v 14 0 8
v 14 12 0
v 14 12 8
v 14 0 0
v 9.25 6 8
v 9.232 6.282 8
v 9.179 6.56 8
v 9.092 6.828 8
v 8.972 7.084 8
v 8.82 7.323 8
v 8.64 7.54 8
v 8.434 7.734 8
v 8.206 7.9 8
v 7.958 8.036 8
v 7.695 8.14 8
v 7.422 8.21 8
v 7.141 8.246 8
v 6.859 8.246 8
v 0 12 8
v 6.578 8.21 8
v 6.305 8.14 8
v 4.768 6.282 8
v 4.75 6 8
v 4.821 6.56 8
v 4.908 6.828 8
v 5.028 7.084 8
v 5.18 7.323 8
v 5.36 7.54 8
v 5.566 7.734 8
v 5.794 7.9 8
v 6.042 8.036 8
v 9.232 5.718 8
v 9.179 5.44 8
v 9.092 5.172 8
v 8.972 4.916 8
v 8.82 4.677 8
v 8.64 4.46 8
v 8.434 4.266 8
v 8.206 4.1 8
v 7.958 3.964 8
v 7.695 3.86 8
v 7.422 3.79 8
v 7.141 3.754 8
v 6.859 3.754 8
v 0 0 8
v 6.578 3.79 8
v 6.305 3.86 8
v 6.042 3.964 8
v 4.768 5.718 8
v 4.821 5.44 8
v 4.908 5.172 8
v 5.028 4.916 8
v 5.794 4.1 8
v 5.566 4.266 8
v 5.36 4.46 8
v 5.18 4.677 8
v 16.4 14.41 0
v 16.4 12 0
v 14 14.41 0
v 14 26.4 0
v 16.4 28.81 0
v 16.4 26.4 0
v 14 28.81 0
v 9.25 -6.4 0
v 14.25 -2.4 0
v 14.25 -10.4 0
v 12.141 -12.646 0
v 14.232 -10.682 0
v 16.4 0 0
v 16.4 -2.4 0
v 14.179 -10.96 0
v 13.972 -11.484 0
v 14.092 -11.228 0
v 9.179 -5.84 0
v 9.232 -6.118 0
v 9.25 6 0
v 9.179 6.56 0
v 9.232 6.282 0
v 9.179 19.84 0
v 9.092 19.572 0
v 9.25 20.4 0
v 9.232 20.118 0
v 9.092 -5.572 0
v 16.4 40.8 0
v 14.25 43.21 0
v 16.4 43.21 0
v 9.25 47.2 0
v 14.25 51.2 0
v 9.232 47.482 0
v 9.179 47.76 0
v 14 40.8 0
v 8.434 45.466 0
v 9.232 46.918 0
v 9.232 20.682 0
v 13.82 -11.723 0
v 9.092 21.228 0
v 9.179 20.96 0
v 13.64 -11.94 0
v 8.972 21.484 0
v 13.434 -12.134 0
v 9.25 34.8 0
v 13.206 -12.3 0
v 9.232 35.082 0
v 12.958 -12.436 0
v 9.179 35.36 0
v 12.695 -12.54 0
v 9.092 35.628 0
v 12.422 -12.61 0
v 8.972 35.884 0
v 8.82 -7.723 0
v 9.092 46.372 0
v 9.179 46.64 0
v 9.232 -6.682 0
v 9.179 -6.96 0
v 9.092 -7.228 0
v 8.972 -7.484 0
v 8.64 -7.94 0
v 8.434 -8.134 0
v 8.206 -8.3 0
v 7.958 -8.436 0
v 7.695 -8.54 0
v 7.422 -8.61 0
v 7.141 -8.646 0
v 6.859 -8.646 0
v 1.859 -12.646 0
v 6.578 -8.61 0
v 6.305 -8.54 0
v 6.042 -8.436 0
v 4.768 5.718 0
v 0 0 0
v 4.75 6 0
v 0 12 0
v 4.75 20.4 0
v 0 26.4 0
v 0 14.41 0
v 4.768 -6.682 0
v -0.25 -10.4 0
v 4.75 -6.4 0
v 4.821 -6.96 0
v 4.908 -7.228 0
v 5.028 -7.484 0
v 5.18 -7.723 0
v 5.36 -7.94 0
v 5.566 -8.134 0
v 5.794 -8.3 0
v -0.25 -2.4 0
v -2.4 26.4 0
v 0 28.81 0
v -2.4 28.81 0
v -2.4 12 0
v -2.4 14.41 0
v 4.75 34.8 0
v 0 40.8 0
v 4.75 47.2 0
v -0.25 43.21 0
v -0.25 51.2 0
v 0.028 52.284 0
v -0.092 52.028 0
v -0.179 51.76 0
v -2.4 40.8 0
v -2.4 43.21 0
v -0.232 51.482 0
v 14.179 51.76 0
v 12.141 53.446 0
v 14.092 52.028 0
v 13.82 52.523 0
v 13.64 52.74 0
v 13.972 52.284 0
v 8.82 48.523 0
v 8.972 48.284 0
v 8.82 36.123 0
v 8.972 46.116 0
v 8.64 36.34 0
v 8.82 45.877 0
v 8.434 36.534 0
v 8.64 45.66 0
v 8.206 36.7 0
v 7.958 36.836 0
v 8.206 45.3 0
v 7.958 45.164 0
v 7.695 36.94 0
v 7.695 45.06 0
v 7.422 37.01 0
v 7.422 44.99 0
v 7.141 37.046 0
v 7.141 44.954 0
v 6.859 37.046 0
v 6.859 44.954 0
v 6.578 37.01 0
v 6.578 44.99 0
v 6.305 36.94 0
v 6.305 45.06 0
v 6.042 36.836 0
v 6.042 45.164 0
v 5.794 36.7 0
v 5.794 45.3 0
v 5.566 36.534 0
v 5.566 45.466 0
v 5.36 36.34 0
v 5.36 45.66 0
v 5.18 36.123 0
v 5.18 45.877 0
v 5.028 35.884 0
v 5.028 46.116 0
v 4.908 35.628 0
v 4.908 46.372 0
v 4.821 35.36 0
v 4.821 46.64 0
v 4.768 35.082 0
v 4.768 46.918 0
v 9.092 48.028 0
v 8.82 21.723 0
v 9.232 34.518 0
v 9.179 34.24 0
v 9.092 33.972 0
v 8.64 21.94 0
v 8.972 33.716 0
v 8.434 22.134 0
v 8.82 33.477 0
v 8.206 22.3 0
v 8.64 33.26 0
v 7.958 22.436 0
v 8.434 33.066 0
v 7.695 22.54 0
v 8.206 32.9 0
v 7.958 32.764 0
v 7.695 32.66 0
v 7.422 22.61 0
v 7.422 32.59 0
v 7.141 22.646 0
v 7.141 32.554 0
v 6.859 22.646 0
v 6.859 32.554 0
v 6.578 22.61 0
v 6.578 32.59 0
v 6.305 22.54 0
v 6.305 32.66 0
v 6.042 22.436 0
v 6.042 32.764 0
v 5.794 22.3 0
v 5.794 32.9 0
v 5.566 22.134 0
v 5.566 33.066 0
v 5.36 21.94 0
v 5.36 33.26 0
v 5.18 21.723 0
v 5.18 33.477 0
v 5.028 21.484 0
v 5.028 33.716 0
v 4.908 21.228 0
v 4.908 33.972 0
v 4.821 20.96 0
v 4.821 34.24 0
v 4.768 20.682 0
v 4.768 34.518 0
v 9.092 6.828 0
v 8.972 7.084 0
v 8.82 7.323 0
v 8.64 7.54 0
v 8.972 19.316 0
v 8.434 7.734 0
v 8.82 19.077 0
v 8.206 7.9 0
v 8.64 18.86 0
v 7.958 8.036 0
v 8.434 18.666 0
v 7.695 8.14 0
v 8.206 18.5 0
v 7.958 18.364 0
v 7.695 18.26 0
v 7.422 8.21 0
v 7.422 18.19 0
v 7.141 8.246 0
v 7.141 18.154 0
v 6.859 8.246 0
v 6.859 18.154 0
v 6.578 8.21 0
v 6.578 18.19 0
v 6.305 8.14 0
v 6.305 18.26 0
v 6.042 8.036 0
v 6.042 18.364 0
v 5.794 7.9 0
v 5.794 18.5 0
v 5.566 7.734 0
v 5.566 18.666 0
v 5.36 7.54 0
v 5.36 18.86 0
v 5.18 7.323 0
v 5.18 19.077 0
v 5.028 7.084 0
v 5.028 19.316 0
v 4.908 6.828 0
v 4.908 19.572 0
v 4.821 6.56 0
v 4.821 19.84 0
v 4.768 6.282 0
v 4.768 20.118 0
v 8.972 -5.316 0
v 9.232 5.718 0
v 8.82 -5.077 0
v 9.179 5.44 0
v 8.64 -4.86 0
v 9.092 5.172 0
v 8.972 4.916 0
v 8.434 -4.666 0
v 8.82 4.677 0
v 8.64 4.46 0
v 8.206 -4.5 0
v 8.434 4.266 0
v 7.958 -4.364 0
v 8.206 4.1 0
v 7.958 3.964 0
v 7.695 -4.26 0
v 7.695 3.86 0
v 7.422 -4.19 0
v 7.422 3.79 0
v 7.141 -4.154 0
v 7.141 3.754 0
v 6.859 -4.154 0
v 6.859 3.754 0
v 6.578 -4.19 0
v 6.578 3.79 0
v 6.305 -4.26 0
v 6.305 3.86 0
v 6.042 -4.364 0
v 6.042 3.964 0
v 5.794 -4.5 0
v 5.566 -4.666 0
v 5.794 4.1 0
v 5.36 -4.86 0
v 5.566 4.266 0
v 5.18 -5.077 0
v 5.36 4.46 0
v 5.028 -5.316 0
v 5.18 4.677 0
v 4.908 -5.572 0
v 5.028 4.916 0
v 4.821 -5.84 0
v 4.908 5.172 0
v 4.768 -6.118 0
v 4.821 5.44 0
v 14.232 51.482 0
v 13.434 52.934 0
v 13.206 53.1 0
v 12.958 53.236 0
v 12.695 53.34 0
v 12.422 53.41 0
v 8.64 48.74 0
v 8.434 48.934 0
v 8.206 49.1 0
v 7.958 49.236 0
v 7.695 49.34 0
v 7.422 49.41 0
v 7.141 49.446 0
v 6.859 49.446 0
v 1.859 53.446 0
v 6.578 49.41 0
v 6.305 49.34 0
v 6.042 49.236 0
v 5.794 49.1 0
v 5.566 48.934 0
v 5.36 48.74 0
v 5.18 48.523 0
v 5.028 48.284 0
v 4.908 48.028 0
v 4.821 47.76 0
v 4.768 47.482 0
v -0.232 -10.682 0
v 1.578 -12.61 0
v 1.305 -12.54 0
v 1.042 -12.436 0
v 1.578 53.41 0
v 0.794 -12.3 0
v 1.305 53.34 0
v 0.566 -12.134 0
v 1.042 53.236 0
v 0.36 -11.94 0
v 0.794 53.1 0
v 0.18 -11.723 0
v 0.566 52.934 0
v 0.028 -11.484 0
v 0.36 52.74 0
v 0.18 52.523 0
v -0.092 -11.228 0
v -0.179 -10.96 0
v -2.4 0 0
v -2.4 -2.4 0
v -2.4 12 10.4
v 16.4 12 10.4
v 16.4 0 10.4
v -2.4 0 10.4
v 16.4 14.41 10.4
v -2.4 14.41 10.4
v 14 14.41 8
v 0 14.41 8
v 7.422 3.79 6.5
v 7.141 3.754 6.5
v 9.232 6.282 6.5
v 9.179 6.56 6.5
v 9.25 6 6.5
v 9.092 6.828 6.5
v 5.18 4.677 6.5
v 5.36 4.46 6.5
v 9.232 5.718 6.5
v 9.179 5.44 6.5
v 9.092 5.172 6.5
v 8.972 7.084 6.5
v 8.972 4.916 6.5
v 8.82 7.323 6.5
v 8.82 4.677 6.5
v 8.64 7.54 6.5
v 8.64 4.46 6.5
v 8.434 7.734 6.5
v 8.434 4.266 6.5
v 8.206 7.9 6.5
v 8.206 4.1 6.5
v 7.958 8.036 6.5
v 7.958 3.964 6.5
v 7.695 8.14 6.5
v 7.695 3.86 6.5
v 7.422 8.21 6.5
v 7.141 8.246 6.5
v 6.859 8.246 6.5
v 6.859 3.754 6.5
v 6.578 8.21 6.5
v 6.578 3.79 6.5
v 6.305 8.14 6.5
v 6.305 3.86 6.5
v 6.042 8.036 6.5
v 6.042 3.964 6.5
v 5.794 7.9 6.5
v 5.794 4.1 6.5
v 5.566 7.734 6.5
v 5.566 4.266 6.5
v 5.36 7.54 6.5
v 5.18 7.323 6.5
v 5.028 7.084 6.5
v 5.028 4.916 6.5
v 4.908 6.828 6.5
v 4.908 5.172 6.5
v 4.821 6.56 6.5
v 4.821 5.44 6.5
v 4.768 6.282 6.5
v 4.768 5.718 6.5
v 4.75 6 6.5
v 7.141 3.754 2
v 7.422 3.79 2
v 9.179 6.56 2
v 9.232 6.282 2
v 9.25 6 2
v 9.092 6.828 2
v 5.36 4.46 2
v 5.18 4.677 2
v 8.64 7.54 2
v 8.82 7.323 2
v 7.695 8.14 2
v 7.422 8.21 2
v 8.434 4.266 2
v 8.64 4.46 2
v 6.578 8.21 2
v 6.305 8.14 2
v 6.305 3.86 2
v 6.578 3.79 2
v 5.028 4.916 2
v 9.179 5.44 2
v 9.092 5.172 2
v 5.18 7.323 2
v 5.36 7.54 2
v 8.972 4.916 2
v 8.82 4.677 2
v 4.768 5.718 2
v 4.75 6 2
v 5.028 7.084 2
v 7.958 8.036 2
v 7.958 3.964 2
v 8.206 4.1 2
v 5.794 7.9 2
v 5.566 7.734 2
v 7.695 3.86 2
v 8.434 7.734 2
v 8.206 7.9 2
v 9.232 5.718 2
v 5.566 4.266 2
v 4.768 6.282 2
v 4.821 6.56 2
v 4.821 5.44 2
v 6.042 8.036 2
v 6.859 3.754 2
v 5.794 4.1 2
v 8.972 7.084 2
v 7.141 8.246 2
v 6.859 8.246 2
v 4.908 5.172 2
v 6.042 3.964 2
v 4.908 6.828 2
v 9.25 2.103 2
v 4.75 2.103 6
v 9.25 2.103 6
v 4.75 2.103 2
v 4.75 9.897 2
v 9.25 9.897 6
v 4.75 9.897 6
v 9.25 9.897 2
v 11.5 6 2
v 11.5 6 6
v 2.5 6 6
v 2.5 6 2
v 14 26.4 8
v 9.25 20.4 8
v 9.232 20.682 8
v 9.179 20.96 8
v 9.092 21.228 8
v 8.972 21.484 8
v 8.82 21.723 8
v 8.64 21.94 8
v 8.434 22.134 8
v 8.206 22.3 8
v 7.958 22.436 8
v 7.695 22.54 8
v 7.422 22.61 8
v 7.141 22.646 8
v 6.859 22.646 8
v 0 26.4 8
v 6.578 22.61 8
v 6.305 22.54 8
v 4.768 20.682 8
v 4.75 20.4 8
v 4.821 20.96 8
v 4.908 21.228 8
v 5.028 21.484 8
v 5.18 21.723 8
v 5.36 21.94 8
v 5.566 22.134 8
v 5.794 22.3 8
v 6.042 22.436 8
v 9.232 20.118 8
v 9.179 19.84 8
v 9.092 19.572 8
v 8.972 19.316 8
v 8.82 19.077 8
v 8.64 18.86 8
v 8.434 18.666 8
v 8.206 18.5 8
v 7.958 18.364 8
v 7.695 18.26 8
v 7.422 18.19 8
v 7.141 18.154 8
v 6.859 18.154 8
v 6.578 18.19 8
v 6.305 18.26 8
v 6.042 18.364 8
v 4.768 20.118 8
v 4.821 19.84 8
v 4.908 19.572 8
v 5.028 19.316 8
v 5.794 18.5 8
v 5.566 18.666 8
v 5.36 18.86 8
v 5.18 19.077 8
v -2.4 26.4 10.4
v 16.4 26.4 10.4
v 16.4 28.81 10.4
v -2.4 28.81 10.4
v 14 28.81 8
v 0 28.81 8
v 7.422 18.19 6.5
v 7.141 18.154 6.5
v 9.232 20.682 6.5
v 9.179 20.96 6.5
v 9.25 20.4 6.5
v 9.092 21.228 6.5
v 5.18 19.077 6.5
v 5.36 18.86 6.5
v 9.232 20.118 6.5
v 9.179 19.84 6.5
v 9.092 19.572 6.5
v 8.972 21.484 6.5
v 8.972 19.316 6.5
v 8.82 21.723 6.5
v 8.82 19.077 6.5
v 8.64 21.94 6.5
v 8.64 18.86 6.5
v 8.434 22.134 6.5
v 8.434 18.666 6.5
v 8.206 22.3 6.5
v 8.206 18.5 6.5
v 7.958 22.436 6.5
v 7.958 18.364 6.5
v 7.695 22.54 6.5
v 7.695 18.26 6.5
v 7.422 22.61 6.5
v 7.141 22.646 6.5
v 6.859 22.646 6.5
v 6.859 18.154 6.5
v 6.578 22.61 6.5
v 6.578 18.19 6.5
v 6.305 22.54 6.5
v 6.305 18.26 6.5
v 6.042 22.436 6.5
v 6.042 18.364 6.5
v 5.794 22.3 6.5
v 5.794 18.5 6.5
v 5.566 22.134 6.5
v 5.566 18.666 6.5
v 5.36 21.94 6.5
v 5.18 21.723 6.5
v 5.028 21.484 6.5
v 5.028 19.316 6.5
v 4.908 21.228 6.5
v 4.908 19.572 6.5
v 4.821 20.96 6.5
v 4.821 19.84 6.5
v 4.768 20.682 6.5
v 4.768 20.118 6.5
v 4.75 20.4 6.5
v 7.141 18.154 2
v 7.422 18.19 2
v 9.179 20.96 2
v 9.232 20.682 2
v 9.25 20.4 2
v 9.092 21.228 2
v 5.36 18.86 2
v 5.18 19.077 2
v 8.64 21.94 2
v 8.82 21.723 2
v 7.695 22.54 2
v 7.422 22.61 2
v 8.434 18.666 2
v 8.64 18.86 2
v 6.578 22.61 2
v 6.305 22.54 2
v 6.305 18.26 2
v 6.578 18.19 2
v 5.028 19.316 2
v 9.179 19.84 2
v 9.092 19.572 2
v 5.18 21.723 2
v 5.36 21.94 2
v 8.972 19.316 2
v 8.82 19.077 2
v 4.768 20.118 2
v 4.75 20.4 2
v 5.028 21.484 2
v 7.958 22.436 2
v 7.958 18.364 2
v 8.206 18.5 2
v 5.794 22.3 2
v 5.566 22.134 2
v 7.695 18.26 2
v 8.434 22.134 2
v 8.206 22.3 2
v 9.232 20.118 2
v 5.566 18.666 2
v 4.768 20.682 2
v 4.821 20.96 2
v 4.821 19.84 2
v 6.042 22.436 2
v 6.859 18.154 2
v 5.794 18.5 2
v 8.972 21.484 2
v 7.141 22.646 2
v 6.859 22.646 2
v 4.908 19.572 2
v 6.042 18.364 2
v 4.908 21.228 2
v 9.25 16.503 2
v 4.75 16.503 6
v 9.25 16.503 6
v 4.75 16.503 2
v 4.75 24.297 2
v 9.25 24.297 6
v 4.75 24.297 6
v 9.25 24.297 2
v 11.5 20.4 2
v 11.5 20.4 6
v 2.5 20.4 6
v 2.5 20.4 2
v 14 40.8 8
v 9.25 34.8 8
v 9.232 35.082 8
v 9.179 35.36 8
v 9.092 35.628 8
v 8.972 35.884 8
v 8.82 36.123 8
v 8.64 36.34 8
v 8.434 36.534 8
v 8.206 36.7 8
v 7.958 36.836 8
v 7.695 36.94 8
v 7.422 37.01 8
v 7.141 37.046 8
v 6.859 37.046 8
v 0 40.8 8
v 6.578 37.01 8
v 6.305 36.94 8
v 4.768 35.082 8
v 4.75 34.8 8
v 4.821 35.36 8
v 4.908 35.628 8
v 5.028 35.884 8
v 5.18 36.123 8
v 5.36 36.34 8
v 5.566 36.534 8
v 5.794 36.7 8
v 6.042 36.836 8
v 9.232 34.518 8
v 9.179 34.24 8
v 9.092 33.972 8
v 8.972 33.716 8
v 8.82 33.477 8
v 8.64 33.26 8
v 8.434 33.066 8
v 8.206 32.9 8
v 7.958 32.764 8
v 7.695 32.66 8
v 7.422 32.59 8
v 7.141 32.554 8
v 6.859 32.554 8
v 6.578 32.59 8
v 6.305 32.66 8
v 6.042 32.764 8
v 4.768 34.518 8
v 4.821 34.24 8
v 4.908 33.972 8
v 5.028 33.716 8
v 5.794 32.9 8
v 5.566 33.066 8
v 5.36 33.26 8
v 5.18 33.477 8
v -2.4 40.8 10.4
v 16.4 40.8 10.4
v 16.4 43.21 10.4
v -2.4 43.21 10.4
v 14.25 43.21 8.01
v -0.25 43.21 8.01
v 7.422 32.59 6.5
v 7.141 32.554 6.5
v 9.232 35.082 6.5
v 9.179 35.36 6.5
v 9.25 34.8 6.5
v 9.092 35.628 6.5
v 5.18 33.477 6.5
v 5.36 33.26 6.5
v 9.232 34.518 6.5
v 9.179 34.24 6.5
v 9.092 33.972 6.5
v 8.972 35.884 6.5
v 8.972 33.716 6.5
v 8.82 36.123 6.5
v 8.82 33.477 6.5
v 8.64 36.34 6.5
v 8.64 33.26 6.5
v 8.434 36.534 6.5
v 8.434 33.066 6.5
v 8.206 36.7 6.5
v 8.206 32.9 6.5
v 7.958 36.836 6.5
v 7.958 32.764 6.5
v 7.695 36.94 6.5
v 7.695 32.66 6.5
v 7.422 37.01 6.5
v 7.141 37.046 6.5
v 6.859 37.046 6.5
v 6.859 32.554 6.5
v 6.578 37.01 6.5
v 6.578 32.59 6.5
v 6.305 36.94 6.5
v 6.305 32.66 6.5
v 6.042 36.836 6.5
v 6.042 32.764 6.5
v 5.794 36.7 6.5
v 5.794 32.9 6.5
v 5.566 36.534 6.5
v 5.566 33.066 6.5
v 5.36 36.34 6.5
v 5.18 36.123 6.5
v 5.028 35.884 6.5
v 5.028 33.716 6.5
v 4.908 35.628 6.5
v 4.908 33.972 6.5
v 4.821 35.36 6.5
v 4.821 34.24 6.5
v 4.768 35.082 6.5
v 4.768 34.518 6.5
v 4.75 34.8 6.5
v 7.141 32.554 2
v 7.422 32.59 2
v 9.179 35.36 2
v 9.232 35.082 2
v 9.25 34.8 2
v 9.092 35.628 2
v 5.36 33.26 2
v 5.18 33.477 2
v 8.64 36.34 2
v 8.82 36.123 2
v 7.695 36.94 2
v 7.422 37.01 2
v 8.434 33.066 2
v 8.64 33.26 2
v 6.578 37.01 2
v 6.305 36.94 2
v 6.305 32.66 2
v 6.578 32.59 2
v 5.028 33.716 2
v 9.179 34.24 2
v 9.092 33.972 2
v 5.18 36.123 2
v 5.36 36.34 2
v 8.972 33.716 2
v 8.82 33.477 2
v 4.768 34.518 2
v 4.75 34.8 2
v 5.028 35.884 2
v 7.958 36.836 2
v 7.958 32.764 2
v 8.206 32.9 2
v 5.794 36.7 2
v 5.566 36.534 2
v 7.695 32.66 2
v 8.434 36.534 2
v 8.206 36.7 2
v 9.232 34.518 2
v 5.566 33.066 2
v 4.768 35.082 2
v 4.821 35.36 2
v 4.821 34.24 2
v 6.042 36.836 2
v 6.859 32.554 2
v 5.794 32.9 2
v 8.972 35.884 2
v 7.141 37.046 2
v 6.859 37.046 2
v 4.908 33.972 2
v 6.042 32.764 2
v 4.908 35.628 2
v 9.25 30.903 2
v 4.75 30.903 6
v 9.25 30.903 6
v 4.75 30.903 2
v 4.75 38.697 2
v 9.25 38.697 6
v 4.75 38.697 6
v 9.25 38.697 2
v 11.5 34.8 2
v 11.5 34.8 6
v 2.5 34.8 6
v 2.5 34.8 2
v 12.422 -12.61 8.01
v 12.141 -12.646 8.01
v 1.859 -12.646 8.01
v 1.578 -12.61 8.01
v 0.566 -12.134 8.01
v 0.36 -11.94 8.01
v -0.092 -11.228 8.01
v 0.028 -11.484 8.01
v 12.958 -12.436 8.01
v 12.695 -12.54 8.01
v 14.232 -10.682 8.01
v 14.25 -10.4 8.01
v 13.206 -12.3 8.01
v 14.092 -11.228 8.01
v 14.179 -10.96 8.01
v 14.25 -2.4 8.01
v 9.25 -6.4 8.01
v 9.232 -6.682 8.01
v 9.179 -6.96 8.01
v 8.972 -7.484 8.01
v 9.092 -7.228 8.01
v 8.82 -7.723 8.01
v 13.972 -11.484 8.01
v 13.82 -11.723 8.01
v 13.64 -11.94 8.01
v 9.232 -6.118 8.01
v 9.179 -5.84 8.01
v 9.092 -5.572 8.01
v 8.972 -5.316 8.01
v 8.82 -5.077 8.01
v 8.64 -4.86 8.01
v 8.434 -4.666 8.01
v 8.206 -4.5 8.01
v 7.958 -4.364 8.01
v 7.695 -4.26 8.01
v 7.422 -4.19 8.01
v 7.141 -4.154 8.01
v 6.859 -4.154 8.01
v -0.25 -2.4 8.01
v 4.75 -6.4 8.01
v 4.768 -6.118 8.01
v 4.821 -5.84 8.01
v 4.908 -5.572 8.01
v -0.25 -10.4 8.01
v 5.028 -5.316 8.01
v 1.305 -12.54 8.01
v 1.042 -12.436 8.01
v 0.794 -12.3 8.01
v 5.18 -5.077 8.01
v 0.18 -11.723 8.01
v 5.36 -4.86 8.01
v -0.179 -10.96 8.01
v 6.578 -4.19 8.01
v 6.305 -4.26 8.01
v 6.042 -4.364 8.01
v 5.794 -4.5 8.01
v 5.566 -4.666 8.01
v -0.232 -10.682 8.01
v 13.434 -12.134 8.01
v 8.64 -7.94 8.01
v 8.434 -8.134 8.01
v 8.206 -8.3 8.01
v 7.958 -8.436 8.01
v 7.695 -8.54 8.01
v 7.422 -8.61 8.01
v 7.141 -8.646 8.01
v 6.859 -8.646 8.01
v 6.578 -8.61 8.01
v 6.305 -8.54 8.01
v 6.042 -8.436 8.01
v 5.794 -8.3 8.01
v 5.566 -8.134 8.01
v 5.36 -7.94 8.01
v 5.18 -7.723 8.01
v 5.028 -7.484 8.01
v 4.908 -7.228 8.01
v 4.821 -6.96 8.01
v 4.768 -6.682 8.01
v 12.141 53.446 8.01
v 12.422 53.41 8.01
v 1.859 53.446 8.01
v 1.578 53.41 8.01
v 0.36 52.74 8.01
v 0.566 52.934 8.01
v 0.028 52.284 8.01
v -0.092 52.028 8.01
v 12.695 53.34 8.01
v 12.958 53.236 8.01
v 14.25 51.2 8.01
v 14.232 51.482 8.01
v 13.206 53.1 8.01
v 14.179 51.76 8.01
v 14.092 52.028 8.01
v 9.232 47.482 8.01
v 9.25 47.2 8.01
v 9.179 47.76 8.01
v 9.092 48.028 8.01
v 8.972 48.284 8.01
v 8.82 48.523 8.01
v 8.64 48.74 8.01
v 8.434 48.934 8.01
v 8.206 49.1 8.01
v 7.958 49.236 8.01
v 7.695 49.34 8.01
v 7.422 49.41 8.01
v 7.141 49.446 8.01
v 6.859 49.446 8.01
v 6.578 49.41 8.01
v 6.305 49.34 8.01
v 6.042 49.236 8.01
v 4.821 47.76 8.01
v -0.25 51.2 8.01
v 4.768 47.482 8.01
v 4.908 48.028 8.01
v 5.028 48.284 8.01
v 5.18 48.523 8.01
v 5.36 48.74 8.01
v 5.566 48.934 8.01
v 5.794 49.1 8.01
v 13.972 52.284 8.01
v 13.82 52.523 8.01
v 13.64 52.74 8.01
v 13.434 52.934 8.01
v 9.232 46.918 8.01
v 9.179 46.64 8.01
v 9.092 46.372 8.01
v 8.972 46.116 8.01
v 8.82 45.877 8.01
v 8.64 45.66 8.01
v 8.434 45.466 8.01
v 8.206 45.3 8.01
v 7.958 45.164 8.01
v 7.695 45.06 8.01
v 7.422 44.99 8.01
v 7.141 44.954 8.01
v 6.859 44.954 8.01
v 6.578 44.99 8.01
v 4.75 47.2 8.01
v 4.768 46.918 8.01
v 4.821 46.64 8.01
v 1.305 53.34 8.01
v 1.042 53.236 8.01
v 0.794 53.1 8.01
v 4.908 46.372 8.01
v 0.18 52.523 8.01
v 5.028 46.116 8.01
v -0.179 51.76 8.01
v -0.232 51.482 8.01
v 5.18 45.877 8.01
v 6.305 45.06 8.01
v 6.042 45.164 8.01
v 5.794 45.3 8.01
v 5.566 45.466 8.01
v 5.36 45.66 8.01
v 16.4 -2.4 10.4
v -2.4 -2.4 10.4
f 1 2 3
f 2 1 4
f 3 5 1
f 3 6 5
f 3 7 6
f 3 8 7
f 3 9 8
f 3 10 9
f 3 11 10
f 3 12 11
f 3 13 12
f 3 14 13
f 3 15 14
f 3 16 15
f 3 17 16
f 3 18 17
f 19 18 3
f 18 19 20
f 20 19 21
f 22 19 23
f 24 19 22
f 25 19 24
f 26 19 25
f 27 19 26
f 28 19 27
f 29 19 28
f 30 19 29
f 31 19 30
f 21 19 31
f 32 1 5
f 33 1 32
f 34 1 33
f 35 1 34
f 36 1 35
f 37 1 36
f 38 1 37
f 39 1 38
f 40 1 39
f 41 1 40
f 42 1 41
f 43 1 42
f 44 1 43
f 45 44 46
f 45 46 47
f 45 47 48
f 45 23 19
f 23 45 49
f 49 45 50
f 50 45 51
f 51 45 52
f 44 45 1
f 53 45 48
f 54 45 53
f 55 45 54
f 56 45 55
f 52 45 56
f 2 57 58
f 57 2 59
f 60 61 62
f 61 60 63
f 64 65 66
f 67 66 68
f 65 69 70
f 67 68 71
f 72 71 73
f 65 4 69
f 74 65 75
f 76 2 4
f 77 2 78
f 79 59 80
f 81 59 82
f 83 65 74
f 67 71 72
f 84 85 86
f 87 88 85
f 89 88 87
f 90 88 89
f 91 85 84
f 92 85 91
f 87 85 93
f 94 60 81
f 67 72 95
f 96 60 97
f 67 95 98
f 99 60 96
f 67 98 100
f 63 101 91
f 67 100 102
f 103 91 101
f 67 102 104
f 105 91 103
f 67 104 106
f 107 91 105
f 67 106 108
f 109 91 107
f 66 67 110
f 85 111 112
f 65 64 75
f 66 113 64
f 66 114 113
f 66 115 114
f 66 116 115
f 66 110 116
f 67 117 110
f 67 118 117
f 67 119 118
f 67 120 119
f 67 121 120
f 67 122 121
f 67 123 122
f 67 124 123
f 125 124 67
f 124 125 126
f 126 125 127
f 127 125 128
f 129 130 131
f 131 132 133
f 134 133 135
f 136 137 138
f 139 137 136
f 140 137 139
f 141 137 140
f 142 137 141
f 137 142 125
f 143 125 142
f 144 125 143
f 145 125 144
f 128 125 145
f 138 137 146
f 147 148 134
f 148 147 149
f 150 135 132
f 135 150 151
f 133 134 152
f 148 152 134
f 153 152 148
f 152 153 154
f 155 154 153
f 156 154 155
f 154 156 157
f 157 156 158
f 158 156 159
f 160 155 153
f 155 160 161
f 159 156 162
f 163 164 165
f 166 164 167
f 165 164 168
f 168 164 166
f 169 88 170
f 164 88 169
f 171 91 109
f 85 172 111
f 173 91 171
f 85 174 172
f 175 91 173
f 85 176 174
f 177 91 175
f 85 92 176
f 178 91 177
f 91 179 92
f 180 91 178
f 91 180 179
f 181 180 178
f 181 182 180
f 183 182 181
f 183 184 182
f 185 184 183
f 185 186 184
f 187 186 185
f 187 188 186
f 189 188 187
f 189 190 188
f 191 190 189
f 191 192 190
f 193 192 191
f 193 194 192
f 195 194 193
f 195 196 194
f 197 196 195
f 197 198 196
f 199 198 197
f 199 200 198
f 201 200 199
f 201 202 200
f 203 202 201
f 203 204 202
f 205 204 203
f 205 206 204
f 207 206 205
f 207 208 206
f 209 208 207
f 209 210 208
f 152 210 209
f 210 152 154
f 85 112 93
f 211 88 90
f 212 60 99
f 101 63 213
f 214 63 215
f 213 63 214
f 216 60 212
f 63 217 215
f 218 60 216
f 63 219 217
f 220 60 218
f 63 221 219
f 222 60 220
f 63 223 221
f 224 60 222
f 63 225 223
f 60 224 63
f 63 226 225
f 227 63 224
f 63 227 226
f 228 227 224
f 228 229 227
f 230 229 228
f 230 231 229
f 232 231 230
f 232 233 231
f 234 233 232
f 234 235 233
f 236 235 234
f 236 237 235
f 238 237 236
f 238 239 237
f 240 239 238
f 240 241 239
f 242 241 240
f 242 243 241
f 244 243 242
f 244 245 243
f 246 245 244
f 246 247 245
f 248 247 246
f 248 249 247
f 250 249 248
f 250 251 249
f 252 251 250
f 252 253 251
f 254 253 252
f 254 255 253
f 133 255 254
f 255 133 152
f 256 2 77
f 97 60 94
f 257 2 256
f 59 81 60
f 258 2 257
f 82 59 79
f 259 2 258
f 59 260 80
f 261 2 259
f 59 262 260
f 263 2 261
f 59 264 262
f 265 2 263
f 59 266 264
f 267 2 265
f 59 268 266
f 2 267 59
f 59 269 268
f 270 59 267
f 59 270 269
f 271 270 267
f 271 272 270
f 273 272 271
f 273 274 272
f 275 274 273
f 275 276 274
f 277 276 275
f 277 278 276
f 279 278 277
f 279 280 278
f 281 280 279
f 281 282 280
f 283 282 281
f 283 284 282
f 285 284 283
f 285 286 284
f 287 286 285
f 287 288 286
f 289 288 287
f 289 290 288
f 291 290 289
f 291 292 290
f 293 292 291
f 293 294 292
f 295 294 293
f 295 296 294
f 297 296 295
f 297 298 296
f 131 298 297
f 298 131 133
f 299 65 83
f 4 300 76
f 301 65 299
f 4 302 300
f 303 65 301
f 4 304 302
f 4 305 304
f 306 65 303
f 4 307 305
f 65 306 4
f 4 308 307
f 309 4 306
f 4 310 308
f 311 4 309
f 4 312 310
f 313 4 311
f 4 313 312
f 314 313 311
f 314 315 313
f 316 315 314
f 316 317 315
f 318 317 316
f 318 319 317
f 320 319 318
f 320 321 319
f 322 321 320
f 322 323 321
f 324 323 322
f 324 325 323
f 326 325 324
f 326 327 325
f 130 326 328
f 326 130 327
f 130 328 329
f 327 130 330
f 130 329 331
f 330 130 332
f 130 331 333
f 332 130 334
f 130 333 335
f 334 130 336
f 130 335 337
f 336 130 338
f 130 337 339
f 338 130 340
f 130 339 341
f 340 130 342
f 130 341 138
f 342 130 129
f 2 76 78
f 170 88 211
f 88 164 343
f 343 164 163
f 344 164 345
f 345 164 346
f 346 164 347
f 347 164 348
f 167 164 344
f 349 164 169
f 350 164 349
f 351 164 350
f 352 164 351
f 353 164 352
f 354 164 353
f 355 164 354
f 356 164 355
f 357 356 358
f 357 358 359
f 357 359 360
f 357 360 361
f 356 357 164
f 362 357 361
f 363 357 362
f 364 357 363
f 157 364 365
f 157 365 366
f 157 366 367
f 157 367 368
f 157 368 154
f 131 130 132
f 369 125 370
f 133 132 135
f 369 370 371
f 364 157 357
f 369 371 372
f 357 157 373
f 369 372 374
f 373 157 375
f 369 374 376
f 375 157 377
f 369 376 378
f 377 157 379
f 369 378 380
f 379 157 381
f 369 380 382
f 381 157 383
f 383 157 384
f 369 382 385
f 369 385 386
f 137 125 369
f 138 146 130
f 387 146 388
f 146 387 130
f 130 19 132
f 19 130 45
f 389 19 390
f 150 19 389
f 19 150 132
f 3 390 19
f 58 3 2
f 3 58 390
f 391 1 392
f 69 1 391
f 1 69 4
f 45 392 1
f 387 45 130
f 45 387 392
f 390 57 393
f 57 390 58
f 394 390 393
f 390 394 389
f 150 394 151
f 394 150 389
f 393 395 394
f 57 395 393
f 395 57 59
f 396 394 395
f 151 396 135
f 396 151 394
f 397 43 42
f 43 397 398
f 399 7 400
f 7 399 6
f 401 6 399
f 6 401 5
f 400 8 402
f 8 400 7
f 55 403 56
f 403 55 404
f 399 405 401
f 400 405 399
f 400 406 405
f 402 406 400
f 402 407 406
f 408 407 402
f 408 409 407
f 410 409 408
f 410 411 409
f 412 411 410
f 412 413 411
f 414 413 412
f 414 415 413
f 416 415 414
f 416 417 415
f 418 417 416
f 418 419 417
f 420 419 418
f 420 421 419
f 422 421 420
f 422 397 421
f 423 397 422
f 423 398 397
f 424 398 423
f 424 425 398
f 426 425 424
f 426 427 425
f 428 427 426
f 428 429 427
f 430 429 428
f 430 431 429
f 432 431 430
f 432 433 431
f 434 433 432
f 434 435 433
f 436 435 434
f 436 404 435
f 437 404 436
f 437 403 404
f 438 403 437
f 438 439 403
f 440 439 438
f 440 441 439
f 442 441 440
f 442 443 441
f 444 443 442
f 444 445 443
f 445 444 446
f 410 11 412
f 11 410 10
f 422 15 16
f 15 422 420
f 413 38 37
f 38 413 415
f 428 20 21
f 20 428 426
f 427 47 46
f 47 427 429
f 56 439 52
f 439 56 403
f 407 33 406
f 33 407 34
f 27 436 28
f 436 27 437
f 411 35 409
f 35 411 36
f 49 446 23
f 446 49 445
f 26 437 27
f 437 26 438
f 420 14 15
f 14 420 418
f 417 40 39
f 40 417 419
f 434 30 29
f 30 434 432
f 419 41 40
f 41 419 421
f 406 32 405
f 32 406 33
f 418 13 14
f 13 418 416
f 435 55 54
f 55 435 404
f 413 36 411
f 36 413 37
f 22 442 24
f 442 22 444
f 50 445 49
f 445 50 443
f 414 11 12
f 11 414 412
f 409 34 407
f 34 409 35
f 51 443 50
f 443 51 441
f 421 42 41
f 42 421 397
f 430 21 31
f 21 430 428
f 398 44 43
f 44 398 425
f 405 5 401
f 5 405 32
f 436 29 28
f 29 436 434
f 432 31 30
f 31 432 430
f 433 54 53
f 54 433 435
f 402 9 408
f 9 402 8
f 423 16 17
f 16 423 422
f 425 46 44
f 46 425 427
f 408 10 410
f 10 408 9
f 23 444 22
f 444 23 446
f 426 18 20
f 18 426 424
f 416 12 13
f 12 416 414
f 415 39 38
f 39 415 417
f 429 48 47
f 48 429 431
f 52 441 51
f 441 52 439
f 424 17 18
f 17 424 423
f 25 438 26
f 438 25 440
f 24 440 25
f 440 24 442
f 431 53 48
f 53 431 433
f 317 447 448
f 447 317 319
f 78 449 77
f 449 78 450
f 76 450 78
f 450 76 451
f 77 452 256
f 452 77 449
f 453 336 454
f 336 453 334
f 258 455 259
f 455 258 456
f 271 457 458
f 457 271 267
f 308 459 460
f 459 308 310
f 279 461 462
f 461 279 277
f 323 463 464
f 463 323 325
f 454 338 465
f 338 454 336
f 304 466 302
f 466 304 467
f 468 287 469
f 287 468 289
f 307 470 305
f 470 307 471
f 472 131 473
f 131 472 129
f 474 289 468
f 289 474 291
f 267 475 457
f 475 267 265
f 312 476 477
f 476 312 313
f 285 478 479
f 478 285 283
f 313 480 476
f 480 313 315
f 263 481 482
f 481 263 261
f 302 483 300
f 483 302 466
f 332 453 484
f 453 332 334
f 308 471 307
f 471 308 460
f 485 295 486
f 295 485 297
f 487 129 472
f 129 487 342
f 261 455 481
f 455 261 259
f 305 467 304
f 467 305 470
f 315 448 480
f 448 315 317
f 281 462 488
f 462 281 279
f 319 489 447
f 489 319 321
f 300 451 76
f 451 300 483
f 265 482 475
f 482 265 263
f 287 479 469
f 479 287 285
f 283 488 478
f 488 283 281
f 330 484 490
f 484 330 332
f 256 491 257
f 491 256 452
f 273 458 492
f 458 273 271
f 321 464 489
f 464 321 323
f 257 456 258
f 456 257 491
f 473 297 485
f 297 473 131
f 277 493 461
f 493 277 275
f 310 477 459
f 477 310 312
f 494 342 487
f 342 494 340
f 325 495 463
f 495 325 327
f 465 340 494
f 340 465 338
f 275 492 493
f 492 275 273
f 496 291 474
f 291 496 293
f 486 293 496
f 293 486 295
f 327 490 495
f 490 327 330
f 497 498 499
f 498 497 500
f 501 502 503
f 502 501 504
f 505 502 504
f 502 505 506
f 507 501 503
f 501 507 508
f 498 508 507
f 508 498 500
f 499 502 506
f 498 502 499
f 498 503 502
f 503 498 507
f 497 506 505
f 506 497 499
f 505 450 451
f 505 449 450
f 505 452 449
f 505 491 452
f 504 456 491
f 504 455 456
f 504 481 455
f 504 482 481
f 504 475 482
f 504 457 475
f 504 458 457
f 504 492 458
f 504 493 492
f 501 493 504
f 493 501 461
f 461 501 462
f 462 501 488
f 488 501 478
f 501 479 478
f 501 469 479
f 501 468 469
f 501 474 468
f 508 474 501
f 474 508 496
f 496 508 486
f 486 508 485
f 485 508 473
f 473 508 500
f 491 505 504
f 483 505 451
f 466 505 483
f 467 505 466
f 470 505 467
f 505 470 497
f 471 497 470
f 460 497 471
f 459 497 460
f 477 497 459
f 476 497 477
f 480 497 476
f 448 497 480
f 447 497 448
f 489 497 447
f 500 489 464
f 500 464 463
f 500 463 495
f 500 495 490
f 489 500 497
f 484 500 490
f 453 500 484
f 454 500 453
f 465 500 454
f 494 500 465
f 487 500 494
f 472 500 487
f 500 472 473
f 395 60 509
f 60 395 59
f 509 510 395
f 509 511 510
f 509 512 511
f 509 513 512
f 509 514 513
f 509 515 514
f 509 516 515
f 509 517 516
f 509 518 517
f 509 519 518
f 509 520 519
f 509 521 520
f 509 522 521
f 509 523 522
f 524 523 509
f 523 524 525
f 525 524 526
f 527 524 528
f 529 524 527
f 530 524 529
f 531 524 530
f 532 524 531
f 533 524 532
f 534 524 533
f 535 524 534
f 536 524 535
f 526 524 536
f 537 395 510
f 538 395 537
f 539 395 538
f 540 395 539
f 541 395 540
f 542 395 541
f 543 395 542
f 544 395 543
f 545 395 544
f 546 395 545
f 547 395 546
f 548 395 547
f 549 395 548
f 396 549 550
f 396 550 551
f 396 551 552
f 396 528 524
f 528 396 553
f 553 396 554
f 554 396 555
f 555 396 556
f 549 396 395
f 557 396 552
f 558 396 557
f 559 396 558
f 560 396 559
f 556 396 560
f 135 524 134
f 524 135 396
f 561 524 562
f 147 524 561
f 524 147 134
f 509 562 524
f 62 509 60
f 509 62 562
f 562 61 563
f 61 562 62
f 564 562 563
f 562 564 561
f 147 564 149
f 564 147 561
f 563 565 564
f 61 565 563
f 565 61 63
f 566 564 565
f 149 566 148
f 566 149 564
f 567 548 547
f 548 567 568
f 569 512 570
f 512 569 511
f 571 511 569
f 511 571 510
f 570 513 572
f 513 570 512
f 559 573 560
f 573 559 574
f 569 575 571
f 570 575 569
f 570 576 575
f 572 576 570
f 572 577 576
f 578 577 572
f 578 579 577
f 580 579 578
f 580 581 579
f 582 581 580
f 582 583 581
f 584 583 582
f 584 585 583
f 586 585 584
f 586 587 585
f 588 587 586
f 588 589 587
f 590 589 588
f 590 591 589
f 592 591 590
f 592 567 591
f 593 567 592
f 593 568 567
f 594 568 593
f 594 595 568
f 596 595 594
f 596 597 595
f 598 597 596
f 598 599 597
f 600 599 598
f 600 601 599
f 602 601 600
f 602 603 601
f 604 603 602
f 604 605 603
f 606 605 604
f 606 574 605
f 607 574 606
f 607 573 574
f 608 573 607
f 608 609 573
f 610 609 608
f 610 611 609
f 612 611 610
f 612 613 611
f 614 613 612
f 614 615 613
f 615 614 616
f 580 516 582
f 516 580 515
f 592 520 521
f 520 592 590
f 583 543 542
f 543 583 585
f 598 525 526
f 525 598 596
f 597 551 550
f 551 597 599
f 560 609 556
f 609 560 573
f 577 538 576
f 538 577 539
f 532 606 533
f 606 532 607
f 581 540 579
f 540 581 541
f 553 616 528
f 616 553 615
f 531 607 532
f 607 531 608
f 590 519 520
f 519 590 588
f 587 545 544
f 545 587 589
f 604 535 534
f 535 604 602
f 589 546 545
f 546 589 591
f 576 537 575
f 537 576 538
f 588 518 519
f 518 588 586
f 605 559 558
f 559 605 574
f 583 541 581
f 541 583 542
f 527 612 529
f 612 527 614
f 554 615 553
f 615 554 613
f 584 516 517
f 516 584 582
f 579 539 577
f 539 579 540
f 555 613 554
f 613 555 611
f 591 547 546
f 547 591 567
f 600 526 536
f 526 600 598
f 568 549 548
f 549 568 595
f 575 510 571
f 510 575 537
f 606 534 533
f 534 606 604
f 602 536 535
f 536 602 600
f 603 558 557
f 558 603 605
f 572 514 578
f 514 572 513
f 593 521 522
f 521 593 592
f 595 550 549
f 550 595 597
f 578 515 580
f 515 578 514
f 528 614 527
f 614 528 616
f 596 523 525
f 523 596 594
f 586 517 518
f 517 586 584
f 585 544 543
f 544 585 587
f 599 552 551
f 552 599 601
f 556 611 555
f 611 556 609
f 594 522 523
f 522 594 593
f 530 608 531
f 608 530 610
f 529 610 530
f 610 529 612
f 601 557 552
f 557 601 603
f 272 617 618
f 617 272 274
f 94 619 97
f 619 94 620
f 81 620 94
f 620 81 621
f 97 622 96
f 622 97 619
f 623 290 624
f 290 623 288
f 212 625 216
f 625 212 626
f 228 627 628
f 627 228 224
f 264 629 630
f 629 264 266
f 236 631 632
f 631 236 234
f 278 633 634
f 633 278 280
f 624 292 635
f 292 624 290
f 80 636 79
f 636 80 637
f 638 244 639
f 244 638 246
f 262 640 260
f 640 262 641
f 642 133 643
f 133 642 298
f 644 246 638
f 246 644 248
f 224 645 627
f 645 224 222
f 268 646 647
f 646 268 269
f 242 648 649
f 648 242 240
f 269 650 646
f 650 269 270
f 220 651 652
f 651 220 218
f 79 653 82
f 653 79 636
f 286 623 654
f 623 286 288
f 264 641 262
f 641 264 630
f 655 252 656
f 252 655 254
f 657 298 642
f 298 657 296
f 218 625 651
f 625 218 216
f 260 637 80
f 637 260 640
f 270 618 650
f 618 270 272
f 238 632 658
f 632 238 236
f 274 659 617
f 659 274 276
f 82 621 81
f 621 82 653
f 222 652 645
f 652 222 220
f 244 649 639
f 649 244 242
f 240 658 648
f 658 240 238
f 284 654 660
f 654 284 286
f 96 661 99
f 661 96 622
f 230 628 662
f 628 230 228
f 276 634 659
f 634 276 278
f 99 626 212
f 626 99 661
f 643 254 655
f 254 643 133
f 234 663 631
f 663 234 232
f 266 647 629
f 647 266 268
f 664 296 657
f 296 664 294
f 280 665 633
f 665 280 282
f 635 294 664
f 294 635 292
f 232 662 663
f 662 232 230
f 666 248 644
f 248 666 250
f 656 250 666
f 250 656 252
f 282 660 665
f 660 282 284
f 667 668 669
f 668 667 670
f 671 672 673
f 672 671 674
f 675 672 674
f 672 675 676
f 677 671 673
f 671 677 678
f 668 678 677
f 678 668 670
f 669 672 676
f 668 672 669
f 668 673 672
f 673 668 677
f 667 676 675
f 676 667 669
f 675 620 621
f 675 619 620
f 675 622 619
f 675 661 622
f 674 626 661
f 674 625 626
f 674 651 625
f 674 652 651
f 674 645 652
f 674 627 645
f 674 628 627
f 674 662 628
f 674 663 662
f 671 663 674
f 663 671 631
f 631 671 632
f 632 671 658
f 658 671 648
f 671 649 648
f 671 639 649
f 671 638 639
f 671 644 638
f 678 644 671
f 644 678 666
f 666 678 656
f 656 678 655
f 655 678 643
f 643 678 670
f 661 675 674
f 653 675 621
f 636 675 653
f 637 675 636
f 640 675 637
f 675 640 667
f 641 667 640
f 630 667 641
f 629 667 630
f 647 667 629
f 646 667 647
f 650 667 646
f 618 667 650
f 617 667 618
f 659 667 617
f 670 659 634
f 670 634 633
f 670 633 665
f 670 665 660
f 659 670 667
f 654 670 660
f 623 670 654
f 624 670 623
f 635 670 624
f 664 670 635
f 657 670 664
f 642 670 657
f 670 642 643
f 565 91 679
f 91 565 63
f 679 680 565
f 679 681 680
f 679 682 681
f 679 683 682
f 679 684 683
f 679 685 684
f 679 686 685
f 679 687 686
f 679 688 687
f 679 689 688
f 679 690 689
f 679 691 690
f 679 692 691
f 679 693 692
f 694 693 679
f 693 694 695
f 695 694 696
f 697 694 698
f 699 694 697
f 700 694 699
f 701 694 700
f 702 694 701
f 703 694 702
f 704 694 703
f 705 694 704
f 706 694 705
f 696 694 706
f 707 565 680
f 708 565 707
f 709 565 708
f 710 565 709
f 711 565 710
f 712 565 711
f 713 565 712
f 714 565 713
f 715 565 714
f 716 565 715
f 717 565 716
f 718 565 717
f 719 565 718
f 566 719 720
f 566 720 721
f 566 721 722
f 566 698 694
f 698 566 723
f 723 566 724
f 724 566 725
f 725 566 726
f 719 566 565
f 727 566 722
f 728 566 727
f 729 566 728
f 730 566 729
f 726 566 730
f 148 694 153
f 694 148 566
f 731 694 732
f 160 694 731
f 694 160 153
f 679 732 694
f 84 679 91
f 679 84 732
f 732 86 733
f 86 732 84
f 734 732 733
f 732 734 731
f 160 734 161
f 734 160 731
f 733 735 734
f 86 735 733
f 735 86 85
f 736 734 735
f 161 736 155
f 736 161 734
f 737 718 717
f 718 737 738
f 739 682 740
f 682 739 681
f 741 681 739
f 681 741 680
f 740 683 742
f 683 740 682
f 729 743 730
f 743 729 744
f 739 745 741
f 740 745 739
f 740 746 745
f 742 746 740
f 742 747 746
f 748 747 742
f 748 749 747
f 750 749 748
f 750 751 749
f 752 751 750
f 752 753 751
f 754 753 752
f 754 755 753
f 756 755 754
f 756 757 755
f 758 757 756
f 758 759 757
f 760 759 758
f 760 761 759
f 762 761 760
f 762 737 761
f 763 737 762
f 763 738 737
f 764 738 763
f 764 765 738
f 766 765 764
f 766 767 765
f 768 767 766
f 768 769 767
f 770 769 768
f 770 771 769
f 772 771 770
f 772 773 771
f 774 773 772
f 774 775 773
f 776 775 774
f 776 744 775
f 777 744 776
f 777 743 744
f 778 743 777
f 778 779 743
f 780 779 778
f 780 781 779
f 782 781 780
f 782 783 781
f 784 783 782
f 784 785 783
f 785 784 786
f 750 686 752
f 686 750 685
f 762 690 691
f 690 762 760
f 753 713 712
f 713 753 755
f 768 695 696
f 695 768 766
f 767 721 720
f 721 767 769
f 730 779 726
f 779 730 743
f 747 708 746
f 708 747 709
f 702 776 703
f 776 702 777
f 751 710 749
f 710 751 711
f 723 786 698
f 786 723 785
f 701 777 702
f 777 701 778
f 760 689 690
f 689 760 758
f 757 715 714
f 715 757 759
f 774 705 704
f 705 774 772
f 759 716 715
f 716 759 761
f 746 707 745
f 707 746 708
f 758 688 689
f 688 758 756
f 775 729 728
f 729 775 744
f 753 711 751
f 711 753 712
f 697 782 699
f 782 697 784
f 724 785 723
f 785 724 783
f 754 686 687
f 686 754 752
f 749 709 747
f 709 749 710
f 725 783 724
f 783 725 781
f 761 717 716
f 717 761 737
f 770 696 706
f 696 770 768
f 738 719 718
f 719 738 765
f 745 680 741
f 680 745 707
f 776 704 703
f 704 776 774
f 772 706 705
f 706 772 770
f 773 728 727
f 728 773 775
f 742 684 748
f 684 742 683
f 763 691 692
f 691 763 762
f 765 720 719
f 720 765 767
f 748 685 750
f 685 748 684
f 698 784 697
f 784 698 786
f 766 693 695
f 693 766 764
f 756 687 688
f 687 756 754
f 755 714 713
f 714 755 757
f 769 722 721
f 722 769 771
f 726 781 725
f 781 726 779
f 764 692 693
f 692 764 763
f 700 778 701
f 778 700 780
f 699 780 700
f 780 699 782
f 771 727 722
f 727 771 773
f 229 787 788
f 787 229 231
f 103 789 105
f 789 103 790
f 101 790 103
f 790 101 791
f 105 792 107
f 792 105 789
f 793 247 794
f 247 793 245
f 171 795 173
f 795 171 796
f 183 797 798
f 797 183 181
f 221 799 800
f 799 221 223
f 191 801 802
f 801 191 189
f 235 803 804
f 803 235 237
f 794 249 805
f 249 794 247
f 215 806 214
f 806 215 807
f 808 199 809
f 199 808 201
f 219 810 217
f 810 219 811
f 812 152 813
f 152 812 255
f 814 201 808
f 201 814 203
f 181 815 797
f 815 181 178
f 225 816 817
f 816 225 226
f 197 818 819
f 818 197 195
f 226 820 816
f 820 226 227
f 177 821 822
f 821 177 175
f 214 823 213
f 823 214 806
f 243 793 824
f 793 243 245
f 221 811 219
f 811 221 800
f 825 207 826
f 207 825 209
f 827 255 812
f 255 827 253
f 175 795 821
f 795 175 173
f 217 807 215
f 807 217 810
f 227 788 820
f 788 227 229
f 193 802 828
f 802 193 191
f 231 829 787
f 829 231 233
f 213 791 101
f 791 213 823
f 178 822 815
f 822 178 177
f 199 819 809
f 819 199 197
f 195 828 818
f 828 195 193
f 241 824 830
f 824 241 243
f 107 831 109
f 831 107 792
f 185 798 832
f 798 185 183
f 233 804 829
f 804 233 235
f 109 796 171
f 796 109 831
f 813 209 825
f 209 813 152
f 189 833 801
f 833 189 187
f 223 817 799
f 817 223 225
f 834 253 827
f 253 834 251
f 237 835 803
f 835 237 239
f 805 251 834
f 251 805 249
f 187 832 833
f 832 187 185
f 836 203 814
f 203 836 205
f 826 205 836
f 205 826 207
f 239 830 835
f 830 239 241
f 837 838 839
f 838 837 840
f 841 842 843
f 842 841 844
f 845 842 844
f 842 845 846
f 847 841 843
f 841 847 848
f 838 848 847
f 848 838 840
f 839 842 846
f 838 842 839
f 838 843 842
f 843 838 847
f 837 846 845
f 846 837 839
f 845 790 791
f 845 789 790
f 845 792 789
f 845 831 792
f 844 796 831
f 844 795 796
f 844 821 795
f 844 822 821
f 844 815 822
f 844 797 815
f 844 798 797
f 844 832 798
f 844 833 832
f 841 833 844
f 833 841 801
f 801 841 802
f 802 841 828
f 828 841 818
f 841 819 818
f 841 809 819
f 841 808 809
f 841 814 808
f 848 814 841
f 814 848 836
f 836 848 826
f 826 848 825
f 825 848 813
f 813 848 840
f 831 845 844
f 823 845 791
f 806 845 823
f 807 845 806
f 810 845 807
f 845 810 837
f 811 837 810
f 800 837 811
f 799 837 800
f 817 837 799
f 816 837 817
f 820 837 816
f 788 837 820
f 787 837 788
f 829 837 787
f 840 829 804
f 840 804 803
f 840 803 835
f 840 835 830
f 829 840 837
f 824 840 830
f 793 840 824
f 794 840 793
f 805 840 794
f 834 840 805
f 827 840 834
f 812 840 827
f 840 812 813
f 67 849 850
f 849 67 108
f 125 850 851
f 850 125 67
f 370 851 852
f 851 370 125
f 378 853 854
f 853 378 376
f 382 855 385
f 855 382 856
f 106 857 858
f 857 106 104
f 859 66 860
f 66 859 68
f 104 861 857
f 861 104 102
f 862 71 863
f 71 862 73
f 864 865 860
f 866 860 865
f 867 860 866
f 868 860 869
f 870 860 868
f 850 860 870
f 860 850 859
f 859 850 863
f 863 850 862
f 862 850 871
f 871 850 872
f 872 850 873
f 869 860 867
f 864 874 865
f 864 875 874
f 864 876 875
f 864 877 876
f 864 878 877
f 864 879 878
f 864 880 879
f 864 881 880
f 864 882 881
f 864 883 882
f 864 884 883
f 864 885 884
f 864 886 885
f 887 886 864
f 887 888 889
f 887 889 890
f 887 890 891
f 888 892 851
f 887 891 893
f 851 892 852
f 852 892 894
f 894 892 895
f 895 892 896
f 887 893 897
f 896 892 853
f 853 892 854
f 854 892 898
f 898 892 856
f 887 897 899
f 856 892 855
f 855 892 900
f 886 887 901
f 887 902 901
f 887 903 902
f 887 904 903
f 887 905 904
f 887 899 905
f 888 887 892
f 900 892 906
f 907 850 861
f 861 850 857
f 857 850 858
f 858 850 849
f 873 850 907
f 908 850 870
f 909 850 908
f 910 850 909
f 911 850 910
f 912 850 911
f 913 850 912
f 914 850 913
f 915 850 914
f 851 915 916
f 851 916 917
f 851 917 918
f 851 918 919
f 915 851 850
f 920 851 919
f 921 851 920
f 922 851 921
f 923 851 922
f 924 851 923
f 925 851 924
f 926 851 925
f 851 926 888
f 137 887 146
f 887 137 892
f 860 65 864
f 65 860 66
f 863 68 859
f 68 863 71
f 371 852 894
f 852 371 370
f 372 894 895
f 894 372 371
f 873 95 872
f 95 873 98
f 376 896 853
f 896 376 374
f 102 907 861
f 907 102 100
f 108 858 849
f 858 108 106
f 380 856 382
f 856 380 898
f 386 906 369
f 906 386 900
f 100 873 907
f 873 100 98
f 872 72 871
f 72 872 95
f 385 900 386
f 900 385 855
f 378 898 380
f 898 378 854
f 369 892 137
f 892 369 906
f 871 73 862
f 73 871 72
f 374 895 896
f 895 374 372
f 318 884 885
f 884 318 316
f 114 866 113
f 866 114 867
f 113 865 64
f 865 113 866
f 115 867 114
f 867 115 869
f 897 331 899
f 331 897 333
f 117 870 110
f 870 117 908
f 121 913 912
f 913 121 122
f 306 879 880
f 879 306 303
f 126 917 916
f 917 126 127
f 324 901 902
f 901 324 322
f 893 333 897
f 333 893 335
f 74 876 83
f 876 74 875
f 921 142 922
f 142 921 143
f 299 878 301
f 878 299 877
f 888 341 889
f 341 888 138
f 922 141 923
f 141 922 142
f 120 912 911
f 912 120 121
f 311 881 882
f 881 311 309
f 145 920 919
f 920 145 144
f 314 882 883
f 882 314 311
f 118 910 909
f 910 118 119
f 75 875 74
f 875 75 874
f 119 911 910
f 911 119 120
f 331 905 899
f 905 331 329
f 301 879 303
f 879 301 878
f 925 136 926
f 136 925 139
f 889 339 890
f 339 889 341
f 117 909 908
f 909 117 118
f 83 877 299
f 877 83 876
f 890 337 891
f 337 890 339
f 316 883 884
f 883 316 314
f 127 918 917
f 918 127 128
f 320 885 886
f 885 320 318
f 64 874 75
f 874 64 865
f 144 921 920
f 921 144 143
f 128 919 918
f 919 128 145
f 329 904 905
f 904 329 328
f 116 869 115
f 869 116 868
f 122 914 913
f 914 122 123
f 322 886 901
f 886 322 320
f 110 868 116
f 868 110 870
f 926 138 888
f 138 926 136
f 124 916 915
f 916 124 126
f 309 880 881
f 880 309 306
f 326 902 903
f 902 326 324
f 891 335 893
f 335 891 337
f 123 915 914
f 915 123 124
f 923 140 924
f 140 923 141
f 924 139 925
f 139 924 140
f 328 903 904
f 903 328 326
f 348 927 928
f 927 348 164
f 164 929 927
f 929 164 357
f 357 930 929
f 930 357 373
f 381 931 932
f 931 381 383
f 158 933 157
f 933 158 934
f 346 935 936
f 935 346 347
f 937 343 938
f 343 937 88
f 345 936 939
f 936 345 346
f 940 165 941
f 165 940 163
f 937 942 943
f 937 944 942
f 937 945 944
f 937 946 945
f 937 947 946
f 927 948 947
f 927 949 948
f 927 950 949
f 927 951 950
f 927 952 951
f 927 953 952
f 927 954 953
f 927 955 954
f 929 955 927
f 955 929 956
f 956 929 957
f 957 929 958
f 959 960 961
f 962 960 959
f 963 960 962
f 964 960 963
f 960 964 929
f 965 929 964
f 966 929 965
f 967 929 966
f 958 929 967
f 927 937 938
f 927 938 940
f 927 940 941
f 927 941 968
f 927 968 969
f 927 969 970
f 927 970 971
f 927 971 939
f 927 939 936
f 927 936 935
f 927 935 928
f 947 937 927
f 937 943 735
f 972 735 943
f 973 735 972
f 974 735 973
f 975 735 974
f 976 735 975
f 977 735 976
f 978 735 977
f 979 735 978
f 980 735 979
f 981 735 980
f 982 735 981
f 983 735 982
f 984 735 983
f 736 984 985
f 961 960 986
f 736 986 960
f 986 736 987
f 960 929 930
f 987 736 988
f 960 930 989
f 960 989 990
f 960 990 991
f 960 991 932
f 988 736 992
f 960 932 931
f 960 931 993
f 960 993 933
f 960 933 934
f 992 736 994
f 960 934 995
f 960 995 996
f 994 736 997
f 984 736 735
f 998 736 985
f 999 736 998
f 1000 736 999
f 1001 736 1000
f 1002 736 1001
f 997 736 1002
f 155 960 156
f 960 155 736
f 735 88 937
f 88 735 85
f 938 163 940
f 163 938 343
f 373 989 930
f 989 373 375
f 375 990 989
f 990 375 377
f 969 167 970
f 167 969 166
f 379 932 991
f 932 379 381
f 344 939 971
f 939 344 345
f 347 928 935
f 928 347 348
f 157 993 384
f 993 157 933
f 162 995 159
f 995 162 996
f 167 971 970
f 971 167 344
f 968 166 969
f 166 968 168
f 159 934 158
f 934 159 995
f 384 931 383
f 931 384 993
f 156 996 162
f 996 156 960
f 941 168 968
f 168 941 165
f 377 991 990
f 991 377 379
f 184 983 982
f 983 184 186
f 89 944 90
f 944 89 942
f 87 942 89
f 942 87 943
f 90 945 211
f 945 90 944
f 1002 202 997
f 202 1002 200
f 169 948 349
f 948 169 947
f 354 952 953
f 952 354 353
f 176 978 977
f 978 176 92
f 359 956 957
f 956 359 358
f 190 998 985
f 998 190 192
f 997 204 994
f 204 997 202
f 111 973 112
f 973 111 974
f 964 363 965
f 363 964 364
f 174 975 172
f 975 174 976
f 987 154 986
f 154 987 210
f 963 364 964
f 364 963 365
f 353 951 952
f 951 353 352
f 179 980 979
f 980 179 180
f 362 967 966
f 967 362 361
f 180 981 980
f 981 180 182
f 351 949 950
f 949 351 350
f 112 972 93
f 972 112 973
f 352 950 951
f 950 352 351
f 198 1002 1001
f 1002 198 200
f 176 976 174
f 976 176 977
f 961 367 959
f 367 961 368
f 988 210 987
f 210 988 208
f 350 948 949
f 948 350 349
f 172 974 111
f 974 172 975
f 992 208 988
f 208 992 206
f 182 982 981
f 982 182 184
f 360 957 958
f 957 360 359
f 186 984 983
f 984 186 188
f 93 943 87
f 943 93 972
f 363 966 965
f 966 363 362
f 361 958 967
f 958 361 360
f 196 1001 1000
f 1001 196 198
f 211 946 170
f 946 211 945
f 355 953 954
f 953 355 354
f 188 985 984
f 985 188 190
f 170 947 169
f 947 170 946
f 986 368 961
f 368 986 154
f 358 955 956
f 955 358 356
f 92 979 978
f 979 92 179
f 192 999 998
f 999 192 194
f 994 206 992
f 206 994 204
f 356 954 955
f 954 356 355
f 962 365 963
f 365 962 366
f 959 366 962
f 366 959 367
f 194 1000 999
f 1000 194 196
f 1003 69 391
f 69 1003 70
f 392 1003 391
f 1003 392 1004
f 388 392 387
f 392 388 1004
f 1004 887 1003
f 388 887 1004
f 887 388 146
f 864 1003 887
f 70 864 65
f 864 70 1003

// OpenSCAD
// [FL_INDEX: keywords="openscad, 3d_parametric, Configurable_Terminal_Block, csg_solid" | COT="Parametric OpenSCAD design from 3DCodeverse"]
// Title: Configurable Terminal Block

//
// Terminal Block
//
//

//How many terminals in the block
NoTerminals = 3; // [1,2,3,4,5,6,7,8,9,10,11,12,13,14,15]
// Diameter of screw in terminal
TerminalHoleSize = 4;
//Terminal Height in mm
TerminalHeight = 8;
//Width of each terminal in mm
TerminalWidth = 12;
//Block Width in mm
BlockWidth = 14;
//Terminal Divider width in mm
TerminalDivider = 2.4;
// Nut Thickness
NutThickness = 4;
// Tabs required
ReqTabs = "Yes"; //[Yes,No]
//Mounting tab length
MountTabLength = 8;
//Mounting tab Height
MountTabHeight = 8;
//Mount tab hole diameter in mm
MountHole = 4;
//Clearence
Clearence = 0.5; 
//Are the nuts Enclosed (nuts added during build - print must be paused) or Slotted (nuts added after build) or Bolted that is Hex head bolt inserted post print.
Enclose =1; //[1:Enclosed, 0: Slotted, 2:Bolted]


//Height of the top of the nut above the base
NutHeight = Enclose > 1 ? NutThickness : TerminalHeight - 2;
//echo (NutHeight);


for (i =[ 0:NoTerminals - 1]) {
	translate ([0,(TerminalWidth + TerminalDivider) * i ,0]) 
		terminal() ;
	}

translate ([- TerminalDivider ,- TerminalDivider , 0]) 
		cube([BlockWidth + TerminalDivider * 2,
				TerminalDivider ,
				TerminalHeight + TerminalDivider]);
if (ReqTabs == "Yes") {
	translate ([0,-TerminalDivider,0]) mirror ([0,1,0]) tab() ;
	translate ([0,(TerminalWidth + TerminalDivider) * NoTerminals,0]) tab() ;
	}

module tab() {
	difference () {
		translate ([MountHole /2, 0,0]) 
			minkowski() {
				cube([BlockWidth - MountHole,
					MountTabLength ,
					MountTabHeight ]);
				cylinder ( r= (MountHole + Clearence )/2 , h =.01 , $fn=50);
			}
		translate ([BlockWidth /2, MountTabLength /2, -1]) cylinder ( r= (MountHole + Clearence )/2 , h = MountTabHeight + 2, $fn=50);
	}
}



module terminal() {
difference() {
	union() {
		cube([BlockWidth,TerminalWidth,TerminalHeight]);
		translate ([- TerminalDivider , TerminalWidth , 0]) 
				cube([BlockWidth + (TerminalDivider * 2),
					TerminalDivider + 0.01 ,
					TerminalHeight + TerminalDivider]);
	}
	translate ([BlockWidth / 2,
				TerminalWidth / 2,  
				NutHeight  + .5]) 
			cylinder ( r= (TerminalHoleSize + Clearence )/2 , 
				h = TerminalHeight, $fn=50);

	translate ([BlockWidth /2,
		TerminalWidth /2,  -1]) 
		cylinder ( r= ( TerminalHoleSize + Clearence ) / 2 , 
		h = NutHeight - (NutThickness / 2) + 1, $fn=50);

	translate ([BlockWidth /2,
				TerminalWidth /2,  
				NutHeight - NutThickness ]) 
			cylinder ( r= TerminalHoleSize + ( Clearence ) , h = NutThickness , $fn=6);
	if (Enclose == 0) {
		translate ([BlockWidth /2 + .1,
					(TerminalWidth  - (TerminalHoleSize + Clearence) * 1.8) / 2 ,  
					NutHeight - NutThickness  ]) 
			cube([ BlockWidth /2	, (TerminalHoleSize + Clearence) * 1.8, NutThickness]);
		}
	}
}
